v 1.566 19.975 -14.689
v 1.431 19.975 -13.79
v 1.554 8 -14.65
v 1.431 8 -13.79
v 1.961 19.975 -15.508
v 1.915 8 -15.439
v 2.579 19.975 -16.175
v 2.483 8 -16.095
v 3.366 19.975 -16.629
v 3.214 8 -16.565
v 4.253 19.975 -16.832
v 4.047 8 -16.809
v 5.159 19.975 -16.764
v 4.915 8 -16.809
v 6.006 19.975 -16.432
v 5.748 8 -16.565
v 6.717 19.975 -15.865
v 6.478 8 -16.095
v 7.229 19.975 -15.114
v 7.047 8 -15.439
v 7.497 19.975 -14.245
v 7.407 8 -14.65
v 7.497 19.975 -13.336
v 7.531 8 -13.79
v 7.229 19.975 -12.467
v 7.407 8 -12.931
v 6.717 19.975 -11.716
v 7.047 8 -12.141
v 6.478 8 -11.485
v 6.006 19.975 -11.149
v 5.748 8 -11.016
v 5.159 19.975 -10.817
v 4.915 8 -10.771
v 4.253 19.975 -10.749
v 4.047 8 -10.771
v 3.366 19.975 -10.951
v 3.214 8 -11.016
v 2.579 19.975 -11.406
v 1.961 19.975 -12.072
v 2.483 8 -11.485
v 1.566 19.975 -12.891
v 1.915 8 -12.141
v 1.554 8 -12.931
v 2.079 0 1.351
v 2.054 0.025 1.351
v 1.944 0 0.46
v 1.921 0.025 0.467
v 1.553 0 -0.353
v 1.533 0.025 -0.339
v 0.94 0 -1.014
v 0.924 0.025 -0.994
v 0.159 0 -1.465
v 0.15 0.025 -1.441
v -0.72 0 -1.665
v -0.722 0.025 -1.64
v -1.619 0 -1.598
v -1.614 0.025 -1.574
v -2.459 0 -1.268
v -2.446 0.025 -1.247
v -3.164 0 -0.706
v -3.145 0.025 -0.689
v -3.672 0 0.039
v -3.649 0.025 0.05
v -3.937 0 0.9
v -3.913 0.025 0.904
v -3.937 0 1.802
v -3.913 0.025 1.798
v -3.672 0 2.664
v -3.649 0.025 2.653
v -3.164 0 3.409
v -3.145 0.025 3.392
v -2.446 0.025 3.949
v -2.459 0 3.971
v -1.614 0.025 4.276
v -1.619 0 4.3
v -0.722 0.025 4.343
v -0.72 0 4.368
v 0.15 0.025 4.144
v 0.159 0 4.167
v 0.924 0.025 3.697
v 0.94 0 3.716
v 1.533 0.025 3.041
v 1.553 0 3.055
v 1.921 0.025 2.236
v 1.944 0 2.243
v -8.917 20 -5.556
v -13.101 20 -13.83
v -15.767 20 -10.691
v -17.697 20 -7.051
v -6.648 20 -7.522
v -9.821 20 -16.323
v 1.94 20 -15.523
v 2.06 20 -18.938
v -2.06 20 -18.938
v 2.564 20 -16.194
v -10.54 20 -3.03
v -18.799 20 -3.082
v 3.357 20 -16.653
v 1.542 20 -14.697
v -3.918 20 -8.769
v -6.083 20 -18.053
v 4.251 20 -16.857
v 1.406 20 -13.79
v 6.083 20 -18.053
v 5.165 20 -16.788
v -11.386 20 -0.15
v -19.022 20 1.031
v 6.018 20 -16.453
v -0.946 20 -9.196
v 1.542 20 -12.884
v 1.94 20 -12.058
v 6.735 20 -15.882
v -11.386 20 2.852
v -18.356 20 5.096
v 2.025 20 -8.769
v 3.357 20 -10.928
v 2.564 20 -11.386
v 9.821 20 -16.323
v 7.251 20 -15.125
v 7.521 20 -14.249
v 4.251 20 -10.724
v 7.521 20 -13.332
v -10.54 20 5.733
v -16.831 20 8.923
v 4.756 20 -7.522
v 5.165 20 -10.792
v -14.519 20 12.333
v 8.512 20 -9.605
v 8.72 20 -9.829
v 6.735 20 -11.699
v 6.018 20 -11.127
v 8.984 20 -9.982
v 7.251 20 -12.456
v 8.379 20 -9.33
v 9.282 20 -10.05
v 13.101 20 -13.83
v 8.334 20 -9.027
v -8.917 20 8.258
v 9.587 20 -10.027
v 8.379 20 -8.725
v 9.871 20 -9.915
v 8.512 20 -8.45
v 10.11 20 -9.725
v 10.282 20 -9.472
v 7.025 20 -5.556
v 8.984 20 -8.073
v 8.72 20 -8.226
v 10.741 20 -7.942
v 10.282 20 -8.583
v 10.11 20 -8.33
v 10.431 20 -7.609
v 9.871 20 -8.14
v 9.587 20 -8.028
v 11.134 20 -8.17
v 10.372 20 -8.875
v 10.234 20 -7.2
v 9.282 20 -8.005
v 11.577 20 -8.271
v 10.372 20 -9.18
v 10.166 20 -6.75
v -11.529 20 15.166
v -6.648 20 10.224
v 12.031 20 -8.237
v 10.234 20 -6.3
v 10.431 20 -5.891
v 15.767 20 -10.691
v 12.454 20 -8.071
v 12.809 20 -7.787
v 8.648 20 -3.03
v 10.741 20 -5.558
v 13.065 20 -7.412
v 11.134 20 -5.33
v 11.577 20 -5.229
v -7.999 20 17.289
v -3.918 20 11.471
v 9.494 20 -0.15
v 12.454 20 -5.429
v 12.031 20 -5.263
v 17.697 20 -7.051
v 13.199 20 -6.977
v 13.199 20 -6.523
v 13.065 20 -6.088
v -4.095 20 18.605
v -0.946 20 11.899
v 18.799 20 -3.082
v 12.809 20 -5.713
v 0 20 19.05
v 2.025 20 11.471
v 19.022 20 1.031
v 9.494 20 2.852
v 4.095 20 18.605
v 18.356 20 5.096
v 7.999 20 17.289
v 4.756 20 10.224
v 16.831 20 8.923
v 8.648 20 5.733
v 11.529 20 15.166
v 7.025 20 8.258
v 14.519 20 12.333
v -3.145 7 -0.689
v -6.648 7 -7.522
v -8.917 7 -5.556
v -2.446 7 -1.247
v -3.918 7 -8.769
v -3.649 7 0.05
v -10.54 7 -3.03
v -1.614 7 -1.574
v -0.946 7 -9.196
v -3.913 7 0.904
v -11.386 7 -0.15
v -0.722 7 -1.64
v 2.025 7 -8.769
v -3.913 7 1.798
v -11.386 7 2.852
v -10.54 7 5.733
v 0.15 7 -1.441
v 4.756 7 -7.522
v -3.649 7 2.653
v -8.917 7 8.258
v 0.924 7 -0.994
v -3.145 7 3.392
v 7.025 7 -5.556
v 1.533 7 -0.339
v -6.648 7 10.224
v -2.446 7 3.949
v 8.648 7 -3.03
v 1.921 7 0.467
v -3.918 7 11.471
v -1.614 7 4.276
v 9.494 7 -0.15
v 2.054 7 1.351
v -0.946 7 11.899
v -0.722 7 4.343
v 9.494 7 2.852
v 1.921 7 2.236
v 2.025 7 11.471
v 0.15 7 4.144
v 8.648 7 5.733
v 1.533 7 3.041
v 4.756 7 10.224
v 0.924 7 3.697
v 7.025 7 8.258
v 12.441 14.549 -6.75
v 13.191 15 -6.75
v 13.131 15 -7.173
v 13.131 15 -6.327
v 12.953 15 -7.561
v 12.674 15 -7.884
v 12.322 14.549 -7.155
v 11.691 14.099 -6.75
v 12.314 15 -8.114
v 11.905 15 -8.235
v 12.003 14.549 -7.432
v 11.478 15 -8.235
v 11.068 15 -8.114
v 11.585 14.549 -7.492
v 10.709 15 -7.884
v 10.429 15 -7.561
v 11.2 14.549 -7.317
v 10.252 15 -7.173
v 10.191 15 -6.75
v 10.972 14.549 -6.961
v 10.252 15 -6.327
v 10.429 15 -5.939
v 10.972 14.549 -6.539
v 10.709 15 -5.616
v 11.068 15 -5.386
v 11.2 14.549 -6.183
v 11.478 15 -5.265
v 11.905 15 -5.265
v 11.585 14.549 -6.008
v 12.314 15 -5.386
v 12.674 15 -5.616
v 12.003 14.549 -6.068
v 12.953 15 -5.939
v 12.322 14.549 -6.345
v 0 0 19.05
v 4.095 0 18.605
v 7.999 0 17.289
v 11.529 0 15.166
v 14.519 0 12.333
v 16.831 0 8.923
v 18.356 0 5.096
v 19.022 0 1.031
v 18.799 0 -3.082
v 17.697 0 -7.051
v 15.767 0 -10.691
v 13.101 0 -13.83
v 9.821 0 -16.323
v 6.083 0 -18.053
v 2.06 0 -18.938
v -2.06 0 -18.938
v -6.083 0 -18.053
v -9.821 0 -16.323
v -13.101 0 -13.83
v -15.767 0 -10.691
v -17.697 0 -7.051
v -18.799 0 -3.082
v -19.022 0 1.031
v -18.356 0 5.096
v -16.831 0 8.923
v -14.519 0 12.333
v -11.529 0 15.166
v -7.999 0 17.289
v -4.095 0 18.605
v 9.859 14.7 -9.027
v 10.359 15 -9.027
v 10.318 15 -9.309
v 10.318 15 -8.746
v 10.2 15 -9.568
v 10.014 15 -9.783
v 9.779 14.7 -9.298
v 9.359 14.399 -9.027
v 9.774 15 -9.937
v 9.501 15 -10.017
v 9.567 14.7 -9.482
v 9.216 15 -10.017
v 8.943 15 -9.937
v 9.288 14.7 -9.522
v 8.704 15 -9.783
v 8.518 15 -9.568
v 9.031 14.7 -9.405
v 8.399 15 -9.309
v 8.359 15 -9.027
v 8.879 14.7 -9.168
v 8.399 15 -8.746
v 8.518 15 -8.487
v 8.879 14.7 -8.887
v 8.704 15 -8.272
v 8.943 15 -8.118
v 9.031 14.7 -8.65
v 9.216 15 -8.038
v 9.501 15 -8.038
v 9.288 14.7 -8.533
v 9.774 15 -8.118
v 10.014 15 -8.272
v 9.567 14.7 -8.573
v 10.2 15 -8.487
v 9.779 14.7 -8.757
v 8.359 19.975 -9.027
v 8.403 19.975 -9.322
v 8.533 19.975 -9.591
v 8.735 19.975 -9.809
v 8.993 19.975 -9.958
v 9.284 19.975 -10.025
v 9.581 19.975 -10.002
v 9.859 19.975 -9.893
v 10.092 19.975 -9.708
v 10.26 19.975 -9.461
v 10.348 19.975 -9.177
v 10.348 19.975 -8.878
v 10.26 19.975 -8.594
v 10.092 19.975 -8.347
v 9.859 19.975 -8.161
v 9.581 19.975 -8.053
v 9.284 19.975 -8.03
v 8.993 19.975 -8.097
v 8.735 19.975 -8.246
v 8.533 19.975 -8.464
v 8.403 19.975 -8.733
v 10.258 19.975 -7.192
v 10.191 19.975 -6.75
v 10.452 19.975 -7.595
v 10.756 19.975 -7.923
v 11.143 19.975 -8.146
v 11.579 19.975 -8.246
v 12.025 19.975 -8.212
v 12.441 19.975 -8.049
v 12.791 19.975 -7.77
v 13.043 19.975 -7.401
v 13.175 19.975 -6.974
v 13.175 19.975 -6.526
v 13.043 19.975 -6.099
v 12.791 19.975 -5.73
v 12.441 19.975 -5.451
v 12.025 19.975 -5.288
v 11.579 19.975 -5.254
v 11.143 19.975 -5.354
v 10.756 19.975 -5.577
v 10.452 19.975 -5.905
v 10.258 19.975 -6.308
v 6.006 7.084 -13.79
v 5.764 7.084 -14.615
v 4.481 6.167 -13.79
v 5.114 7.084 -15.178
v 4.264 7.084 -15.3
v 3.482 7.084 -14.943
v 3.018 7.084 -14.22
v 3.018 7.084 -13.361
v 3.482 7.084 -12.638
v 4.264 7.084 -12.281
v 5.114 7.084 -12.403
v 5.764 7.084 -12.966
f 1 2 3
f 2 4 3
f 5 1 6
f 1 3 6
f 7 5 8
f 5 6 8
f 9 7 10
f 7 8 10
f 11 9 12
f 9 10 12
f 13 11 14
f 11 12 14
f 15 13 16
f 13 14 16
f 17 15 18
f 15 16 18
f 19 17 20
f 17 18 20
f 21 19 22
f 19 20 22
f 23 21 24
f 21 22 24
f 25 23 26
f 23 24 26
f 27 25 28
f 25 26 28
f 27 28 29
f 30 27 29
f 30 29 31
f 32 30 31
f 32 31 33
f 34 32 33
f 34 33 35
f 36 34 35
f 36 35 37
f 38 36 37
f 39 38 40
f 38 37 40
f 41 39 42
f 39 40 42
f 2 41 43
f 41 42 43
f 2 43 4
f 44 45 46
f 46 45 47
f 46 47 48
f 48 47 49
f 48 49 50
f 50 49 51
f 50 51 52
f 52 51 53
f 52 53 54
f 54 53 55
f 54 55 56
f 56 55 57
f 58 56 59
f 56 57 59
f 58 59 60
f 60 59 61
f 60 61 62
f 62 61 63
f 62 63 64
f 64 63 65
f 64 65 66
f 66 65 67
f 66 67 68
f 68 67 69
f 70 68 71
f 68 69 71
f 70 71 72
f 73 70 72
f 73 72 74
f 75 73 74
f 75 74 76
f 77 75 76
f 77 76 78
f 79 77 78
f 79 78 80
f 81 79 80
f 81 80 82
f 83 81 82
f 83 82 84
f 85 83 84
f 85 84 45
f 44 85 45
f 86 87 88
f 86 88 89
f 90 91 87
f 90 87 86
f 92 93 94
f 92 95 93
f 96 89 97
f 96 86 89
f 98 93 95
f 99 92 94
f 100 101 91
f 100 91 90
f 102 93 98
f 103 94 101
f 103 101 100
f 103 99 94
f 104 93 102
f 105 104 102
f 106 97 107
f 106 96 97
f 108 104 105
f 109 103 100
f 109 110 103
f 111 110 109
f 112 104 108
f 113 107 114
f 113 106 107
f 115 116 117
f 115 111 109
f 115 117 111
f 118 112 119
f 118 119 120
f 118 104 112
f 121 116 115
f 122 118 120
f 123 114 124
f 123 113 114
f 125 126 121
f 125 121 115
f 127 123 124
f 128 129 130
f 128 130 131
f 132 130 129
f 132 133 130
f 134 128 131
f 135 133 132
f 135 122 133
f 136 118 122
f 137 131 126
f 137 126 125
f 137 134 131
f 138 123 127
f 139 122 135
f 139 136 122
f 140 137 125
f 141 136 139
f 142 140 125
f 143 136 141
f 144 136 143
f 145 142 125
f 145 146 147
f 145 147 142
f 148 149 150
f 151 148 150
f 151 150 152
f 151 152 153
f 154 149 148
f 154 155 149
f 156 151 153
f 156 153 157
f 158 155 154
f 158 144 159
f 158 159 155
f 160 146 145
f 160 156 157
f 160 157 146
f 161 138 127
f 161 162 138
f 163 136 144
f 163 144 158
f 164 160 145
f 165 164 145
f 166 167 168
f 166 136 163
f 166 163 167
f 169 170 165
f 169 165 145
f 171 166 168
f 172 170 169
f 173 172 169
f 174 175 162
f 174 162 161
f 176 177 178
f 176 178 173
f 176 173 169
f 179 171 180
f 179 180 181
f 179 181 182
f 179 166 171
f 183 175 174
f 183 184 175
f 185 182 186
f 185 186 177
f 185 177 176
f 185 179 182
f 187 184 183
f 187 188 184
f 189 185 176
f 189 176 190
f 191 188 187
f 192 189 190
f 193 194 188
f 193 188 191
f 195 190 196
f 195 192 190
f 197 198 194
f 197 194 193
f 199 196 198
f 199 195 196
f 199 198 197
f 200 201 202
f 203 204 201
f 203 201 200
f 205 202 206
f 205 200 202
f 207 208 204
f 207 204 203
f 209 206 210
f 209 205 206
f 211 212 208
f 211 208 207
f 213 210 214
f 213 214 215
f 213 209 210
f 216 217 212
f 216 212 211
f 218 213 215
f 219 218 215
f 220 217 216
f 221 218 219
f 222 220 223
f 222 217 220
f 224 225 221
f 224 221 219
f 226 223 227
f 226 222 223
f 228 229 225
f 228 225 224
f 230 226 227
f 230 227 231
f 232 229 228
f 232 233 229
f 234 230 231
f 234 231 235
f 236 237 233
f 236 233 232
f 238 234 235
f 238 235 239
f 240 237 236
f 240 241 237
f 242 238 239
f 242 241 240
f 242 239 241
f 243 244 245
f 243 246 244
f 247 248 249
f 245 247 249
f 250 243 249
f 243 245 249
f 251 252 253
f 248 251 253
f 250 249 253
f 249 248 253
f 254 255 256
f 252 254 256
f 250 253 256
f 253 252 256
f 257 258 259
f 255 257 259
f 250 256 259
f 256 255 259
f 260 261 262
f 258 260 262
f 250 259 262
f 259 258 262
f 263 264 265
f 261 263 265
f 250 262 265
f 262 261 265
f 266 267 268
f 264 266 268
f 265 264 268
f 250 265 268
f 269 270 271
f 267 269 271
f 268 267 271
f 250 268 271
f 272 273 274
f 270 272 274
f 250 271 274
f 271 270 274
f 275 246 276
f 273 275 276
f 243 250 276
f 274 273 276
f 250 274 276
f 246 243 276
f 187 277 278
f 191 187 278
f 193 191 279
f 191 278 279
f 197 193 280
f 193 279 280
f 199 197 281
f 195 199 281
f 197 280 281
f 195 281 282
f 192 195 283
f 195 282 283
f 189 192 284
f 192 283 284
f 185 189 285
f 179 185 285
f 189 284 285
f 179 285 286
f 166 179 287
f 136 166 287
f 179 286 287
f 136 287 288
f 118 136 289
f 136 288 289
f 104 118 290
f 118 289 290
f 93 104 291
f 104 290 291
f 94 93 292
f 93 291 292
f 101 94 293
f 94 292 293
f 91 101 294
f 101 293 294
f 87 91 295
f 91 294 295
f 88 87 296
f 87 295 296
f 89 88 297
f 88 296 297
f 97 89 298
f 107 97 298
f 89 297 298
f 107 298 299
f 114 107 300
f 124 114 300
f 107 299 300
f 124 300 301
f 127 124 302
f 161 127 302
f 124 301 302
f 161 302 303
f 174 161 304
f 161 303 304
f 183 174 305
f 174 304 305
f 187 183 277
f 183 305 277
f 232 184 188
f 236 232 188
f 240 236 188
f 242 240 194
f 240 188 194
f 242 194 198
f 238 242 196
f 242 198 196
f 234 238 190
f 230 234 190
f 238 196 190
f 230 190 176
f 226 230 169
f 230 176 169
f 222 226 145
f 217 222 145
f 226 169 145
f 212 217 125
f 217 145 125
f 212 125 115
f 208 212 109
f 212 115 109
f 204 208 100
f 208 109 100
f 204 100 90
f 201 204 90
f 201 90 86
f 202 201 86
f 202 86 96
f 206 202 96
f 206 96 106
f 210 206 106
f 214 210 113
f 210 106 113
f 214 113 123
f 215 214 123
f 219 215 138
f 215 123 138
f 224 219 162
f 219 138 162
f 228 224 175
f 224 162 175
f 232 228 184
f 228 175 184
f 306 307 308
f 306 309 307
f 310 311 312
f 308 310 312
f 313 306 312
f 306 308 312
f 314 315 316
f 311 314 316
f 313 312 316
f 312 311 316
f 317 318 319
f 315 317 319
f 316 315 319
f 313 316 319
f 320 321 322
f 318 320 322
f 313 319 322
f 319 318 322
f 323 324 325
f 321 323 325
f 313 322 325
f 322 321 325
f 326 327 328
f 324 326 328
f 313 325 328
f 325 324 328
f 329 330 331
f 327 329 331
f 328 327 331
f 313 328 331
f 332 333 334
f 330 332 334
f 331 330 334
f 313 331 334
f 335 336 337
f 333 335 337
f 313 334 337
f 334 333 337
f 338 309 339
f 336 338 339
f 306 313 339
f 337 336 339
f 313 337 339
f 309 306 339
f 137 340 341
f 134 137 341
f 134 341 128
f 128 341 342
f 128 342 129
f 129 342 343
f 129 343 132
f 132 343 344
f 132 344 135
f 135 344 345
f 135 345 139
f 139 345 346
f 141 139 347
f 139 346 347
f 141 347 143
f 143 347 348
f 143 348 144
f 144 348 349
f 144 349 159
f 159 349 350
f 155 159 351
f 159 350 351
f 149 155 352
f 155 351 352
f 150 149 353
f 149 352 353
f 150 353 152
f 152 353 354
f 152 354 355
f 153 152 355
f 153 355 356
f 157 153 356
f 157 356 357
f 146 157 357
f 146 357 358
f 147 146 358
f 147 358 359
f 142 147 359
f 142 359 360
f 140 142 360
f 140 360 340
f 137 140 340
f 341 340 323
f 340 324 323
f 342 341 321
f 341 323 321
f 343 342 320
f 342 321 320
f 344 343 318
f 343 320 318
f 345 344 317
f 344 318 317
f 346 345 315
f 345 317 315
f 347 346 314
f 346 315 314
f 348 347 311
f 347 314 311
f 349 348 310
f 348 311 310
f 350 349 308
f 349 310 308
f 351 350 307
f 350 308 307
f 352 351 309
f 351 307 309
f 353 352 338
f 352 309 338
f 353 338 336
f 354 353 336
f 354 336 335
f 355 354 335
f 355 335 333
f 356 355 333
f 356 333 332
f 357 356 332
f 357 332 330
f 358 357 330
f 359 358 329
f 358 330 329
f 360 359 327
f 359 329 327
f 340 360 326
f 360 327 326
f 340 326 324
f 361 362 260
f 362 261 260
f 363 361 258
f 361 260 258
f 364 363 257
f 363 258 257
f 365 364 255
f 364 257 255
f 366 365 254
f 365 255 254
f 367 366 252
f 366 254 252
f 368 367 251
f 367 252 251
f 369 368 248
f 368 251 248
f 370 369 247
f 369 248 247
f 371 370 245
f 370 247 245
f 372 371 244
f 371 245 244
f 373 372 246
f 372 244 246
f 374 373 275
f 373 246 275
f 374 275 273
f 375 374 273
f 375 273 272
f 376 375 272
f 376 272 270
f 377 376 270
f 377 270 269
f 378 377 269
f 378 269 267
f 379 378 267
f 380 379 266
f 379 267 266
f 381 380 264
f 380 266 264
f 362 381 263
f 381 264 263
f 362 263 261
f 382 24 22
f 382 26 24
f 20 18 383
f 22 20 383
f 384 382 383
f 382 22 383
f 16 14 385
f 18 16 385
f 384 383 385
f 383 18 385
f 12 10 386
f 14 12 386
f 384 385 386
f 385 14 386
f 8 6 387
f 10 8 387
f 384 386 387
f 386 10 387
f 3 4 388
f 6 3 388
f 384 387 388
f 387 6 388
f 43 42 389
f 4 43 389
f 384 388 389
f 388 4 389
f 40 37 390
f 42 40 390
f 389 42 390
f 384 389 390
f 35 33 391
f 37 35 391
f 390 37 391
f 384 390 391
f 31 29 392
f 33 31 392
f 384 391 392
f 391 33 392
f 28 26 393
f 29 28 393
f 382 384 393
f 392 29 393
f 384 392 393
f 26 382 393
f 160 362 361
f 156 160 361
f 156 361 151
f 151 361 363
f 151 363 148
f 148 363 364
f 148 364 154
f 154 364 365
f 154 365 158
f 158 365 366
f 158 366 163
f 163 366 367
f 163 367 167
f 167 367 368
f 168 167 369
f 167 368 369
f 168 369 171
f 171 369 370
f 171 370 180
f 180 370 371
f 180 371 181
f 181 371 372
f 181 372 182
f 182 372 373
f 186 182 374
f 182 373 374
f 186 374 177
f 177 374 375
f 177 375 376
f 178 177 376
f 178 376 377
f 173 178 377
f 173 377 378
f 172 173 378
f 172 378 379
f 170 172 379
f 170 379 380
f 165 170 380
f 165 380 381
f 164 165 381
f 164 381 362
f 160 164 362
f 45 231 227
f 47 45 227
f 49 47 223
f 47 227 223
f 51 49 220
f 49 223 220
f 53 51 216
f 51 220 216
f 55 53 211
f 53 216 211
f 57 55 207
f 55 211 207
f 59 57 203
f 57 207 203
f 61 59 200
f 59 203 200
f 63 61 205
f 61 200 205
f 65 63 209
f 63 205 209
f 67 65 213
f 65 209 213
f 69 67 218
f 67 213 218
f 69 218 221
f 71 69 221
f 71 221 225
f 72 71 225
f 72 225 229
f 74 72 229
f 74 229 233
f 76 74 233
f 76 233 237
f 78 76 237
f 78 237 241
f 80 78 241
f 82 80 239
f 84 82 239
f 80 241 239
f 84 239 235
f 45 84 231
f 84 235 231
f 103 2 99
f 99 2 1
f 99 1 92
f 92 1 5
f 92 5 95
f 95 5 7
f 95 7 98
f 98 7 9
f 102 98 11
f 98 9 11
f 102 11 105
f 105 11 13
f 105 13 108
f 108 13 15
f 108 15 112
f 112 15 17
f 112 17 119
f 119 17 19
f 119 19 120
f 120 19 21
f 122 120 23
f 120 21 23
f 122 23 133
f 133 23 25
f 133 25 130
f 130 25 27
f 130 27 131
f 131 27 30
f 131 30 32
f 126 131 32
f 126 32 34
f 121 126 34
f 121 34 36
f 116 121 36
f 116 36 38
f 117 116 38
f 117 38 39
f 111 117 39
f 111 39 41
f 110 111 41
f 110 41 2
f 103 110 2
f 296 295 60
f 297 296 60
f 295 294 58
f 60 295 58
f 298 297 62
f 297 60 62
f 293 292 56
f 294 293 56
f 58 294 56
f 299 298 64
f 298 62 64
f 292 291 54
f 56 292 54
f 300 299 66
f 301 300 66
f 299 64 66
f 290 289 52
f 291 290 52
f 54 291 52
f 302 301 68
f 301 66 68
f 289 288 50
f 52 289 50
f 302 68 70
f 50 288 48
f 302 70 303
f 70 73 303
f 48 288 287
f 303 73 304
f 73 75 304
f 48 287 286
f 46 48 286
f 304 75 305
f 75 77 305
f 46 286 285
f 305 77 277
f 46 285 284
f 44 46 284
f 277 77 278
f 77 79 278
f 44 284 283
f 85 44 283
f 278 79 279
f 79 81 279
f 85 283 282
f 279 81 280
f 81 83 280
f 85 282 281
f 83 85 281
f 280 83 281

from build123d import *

# Parameters (mm, degrees)
SKETCH130_R                                        = 19.05
BOSS_EXTRUDE6_DEPTH                                = 20
HEATCARTRIDGEHOLE9_32_0_28125_DIAMETER_D           = 6.1
HEATCARTRIDGEHOLE9_32_0_28125_DIAMETER_DEPTH       = 12
HEATCARTRIDGEHOLE9_32_0_28125_DIAMETER_CSINK_D     = 6.15
HEATCARTRIDGEHOLE9_32_0_28125_DIAMETER_CSINK_ANGLE = 90
HEATCARTRIDGEHOLE9_32_0_28125_DIAMETER_TIP         = 1.832624888
F_2_0_2_DIAMETER_HOLE1_D                           = 2
F_2_0_2_DIAMETER_HOLE1_DEPTH                       = 5
F_2_0_2_DIAMETER_HOLE1_CSINK_D                     = 2.05
F_2_0_2_DIAMETER_HOLE1_CSINK_ANGLE                 = 90
F_2_0_2_DIAMETER_HOLE1_TIP                         = 0.600860619
F_3_0_3_DIAMETER_HOLE1_D                           = 3
F_3_0_3_DIAMETER_HOLE1_DEPTH                       = 5
F_3_0_3_DIAMETER_HOLE1_CSINK_D                     = 3.05
F_3_0_3_DIAMETER_HOLE1_CSINK_ANGLE                 = 90
F_3_0_3_DIAMETER_HOLE1_TIP                         = 0.901290929
F_6_0_6_DIAMETER_HOLE2_D                           = 6
F_6_0_6_DIAMETER_HOLE2_DEPTH                       = 35.197418143
F_6_0_6_DIAMETER_HOLE2_CSINK_D                     = 6.05
F_6_0_6_DIAMETER_HOLE2_CSINK_ANGLE                 = 90
F_6_0_6_DIAMETER_HOLE2_TIP                         = 1.802581857
SKETCH182_R                                        = 10.54735
CUT_EXTRUDE17_DEPTH                                = 13


with BuildPart() as part:
    # Sketch130 → Boss-Extrude6 (new body)
    with BuildSketch(Plane(origin=(0, 0, 0), x_dir=(1, 0, 0), z_dir=(0, 1, 0))):
        with Locations(Location((0, 0, 0), (0, 0, 270))):
            Circle(SKETCH130_R)
    extrude(amount=BOSS_EXTRUDE6_DEPTH)

    # HeatCartridgeHole9/32 (0.28125) Diameter Hole1
    with Locations(Plane(origin=(0, 20, 0), x_dir=(1, 0, 0), z_dir=(0, 1, 0))):
        with Locations((4.480746418, 13.790319486)):
            CounterSinkHole(HEATCARTRIDGEHOLE9_32_0_28125_DIAMETER_D / 2, HEATCARTRIDGEHOLE9_32_0_28125_DIAMETER_CSINK_D / 2, depth=HEATCARTRIDGEHOLE9_32_0_28125_DIAMETER_DEPTH, counter_sink_angle=HEATCARTRIDGEHOLE9_32_0_28125_DIAMETER_CSINK_ANGLE)
            with Locations((0, 0, -(HEATCARTRIDGEHOLE9_32_0_28125_DIAMETER_DEPTH + HEATCARTRIDGEHOLE9_32_0_28125_DIAMETER_TIP / 2))):  # 118° drill point
                Cone(0, HEATCARTRIDGEHOLE9_32_0_28125_DIAMETER_D / 2, HEATCARTRIDGEHOLE9_32_0_28125_DIAMETER_TIP, mode=Mode.SUBTRACT)

    # Ø2.0 (2) Diameter Hole1
    with Locations(Plane(origin=(0, 20, 0), x_dir=(1, 0, 0), z_dir=(0, 1, 0))):
        with Locations((9.358798046, 9.027462242)):
            CounterSinkHole(F_2_0_2_DIAMETER_HOLE1_D / 2, F_2_0_2_DIAMETER_HOLE1_CSINK_D / 2, depth=F_2_0_2_DIAMETER_HOLE1_DEPTH, counter_sink_angle=F_2_0_2_DIAMETER_HOLE1_CSINK_ANGLE)
            with Locations((0, 0, -(F_2_0_2_DIAMETER_HOLE1_DEPTH + F_2_0_2_DIAMETER_HOLE1_TIP / 2))):  # 118° drill point
                Cone(0, F_2_0_2_DIAMETER_HOLE1_D / 2, F_2_0_2_DIAMETER_HOLE1_TIP, mode=Mode.SUBTRACT)

    # Ø3.0 (3) Diameter Hole1
    with Locations(Plane(origin=(0, 20, 0), x_dir=(1, 0, 0), z_dir=(0, 1, 0))):
        with Locations((11.691342951, 6.75)):
            CounterSinkHole(F_3_0_3_DIAMETER_HOLE1_D / 2, F_3_0_3_DIAMETER_HOLE1_CSINK_D / 2, depth=F_3_0_3_DIAMETER_HOLE1_DEPTH, counter_sink_angle=F_3_0_3_DIAMETER_HOLE1_CSINK_ANGLE)
            with Locations((0, 0, -(F_3_0_3_DIAMETER_HOLE1_DEPTH + F_3_0_3_DIAMETER_HOLE1_TIP / 2))):  # 118° drill point
                Cone(0, F_3_0_3_DIAMETER_HOLE1_D / 2, F_3_0_3_DIAMETER_HOLE1_TIP, mode=Mode.SUBTRACT)

    # Ø6.0 (6) Diameter Hole2
    with Locations(Plane(origin=(0, 0, 0), x_dir=(-1, 0, 0), z_dir=(0, -1, 0))):
        with Locations((0.946159788, -1.351256215)):
            CounterSinkHole(F_6_0_6_DIAMETER_HOLE2_D / 2, F_6_0_6_DIAMETER_HOLE2_CSINK_D / 2, depth=F_6_0_6_DIAMETER_HOLE2_DEPTH, counter_sink_angle=F_6_0_6_DIAMETER_HOLE2_CSINK_ANGLE)
            with Locations((0, 0, -(F_6_0_6_DIAMETER_HOLE2_DEPTH + F_6_0_6_DIAMETER_HOLE2_TIP / 2))):  # 118° drill point
                Cone(0, F_6_0_6_DIAMETER_HOLE2_D / 2, F_6_0_6_DIAMETER_HOLE2_TIP, mode=Mode.SUBTRACT)

    # Sketch182 → Cut-Extrude17 (cut)
    with BuildSketch(Plane(origin=(0, 20, 0), x_dir=(1, 0, 0), z_dir=(0, 1, 0))):
        with Locations(Location((-0.946159788, -1.351256215, 0), (0, 0, 270))):
            Circle(SKETCH182_R)
    extrude(amount=-CUT_EXTRUDE17_DEPTH, mode=Mode.SUBTRACT)


solid = part.part
